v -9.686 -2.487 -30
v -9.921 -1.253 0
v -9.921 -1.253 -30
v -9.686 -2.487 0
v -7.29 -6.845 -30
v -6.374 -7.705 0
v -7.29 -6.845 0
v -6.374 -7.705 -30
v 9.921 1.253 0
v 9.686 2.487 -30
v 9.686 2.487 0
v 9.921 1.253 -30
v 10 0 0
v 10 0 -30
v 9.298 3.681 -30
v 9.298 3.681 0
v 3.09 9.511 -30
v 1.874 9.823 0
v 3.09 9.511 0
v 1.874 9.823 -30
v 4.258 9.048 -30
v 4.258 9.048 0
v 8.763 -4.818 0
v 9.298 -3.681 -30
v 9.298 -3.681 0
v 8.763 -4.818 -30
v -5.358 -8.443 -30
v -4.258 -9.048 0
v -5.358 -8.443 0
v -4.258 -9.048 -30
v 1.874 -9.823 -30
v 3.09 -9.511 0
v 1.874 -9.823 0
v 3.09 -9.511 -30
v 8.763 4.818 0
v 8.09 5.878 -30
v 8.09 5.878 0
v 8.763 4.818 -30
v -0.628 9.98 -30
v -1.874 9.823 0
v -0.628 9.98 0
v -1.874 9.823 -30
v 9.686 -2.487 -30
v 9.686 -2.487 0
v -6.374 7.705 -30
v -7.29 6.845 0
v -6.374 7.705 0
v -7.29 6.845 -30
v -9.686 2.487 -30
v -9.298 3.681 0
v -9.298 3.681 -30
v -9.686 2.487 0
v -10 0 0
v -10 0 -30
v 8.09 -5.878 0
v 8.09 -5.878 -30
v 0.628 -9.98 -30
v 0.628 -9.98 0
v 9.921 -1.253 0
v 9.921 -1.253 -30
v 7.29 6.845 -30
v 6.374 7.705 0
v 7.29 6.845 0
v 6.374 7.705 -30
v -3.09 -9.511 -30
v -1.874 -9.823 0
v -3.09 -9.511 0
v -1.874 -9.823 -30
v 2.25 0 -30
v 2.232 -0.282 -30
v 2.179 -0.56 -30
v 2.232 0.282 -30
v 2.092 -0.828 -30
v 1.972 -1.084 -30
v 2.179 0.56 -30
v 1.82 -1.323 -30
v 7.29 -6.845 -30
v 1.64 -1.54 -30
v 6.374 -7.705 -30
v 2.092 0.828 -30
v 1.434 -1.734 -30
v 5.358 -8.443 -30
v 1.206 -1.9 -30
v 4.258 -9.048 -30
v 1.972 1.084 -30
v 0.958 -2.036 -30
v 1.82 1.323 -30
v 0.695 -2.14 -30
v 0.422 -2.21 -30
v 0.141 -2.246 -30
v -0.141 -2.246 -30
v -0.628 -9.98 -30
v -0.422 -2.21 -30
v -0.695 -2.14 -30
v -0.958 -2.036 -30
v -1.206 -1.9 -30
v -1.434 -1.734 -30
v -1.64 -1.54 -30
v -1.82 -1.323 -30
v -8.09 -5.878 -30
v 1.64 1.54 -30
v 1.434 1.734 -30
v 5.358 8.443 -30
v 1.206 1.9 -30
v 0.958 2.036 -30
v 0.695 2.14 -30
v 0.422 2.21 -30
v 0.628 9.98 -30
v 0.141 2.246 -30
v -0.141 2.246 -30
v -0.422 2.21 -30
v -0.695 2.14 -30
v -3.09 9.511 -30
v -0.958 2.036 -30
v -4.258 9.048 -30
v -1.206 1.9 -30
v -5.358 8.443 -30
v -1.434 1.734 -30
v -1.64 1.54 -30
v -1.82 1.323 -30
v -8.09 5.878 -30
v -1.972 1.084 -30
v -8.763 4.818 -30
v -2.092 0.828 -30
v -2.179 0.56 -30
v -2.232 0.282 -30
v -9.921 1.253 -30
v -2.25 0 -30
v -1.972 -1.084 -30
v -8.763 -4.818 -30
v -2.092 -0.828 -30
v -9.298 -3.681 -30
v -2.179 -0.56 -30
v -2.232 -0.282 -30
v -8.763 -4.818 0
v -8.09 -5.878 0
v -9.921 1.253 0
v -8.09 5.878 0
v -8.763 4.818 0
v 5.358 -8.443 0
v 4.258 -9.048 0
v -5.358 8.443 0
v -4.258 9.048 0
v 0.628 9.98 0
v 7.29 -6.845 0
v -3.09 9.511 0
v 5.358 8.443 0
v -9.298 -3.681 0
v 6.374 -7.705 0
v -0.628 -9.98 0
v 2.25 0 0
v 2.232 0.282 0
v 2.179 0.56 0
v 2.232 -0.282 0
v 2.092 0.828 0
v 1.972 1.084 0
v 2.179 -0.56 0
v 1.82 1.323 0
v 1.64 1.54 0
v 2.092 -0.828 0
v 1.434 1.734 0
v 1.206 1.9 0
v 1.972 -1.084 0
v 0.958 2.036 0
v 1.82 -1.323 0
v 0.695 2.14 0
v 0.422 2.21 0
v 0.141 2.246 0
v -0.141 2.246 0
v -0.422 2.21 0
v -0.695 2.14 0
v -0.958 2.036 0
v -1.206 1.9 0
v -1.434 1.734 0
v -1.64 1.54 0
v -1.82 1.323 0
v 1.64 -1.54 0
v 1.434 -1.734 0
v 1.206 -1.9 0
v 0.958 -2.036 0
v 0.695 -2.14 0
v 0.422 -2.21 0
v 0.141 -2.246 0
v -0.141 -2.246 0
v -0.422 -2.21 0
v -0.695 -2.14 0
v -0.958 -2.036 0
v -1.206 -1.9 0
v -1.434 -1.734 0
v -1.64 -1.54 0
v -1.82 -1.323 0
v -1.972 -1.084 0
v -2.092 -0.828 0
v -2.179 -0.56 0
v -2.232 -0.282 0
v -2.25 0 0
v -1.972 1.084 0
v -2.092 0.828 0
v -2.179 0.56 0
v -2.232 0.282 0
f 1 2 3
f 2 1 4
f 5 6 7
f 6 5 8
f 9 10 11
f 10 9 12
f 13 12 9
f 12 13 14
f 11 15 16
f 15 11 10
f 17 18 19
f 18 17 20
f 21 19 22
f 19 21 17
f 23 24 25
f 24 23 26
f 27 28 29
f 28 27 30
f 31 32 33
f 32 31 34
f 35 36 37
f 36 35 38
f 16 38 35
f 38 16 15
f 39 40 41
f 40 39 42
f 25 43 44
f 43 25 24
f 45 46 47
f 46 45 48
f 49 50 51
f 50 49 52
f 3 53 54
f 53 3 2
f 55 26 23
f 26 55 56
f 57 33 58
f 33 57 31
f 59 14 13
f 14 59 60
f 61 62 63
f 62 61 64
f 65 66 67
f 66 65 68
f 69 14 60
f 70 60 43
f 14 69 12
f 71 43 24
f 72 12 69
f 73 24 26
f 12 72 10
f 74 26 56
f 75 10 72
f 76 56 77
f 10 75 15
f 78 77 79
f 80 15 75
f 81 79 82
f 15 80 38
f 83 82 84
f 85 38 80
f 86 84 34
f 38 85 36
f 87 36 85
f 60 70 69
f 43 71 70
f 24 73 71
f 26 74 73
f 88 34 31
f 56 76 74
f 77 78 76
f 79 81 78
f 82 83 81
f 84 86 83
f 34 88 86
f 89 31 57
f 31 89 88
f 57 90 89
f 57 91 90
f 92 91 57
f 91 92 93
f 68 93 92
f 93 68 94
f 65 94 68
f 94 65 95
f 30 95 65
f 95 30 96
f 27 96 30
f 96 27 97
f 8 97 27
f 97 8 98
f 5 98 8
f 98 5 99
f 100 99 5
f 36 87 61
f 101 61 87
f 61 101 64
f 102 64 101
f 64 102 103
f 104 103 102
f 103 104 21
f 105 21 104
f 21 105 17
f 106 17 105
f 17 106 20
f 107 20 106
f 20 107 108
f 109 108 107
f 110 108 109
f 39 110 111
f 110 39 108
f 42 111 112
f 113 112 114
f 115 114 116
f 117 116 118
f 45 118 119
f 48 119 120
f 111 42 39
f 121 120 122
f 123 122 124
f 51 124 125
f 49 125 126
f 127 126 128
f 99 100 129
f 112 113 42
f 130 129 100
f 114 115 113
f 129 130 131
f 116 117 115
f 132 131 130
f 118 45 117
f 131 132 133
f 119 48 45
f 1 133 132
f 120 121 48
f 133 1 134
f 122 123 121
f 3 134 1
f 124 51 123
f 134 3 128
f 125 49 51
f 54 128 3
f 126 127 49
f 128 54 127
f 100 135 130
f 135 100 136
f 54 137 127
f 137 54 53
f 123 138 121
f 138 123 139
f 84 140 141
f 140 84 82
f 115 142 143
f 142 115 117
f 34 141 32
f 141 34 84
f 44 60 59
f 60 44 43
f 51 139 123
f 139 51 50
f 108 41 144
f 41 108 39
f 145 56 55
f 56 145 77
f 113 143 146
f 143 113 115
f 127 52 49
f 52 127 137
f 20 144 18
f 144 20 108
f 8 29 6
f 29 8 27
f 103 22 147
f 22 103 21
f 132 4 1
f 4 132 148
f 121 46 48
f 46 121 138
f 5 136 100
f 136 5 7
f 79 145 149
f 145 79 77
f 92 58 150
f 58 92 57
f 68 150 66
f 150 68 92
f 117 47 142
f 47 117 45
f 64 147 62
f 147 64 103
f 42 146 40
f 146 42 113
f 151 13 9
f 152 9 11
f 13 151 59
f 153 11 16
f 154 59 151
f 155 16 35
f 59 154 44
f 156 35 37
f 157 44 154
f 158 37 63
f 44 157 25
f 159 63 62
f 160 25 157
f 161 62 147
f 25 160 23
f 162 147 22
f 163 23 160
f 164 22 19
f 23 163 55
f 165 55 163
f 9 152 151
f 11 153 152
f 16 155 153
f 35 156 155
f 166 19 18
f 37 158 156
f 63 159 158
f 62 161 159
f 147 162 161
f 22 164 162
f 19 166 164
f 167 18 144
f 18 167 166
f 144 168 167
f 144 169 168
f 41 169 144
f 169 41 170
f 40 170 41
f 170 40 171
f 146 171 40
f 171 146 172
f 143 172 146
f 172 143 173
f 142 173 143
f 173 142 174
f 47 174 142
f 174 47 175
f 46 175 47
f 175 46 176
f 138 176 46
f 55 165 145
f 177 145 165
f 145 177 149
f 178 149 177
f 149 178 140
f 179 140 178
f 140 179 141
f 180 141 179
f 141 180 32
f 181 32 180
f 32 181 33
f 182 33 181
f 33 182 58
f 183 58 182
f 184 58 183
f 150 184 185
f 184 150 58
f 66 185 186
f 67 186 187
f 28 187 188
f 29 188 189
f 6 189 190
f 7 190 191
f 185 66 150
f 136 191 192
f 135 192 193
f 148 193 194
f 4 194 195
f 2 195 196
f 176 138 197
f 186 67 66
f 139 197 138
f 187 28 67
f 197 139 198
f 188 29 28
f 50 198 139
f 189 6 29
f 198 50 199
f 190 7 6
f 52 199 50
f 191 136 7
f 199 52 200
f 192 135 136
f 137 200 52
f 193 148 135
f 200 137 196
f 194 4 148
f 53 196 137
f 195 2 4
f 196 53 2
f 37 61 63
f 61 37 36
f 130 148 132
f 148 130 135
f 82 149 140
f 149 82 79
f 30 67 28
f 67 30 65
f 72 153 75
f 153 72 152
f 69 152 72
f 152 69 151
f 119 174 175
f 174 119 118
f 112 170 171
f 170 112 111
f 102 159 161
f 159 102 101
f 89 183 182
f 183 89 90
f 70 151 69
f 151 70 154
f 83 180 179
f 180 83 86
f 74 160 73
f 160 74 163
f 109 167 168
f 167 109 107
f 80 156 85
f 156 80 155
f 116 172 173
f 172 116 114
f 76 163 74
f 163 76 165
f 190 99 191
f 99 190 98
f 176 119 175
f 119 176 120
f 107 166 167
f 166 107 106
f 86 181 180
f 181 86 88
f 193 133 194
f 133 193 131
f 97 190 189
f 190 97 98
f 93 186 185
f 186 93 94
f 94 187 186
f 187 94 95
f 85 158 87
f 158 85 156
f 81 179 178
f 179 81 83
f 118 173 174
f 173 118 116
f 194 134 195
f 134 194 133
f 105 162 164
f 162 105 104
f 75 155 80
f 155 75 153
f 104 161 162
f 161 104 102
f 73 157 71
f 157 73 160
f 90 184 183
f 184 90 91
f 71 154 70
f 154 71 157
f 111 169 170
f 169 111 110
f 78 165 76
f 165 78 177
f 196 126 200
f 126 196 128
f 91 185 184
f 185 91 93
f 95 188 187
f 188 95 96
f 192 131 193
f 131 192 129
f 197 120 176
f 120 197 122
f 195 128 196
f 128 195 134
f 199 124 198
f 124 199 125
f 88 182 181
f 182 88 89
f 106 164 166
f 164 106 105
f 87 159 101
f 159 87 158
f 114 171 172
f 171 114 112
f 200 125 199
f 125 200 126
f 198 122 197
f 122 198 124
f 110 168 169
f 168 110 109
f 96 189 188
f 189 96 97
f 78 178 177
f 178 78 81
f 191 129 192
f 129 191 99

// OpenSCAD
$fn = 50;


difference() {
	union() {
		translate(v = [0, 0, -30.0000000000]) {
			cylinder(h = 30, r = 10.0000000000);
		}
		cylinder(h = 0, r = 13.0000000000);
	}
	union() {
		#translate(v = [0, 0, -30]) {
			cylinder(h = 30, r = 2.2500000000);
		}
	}
}
